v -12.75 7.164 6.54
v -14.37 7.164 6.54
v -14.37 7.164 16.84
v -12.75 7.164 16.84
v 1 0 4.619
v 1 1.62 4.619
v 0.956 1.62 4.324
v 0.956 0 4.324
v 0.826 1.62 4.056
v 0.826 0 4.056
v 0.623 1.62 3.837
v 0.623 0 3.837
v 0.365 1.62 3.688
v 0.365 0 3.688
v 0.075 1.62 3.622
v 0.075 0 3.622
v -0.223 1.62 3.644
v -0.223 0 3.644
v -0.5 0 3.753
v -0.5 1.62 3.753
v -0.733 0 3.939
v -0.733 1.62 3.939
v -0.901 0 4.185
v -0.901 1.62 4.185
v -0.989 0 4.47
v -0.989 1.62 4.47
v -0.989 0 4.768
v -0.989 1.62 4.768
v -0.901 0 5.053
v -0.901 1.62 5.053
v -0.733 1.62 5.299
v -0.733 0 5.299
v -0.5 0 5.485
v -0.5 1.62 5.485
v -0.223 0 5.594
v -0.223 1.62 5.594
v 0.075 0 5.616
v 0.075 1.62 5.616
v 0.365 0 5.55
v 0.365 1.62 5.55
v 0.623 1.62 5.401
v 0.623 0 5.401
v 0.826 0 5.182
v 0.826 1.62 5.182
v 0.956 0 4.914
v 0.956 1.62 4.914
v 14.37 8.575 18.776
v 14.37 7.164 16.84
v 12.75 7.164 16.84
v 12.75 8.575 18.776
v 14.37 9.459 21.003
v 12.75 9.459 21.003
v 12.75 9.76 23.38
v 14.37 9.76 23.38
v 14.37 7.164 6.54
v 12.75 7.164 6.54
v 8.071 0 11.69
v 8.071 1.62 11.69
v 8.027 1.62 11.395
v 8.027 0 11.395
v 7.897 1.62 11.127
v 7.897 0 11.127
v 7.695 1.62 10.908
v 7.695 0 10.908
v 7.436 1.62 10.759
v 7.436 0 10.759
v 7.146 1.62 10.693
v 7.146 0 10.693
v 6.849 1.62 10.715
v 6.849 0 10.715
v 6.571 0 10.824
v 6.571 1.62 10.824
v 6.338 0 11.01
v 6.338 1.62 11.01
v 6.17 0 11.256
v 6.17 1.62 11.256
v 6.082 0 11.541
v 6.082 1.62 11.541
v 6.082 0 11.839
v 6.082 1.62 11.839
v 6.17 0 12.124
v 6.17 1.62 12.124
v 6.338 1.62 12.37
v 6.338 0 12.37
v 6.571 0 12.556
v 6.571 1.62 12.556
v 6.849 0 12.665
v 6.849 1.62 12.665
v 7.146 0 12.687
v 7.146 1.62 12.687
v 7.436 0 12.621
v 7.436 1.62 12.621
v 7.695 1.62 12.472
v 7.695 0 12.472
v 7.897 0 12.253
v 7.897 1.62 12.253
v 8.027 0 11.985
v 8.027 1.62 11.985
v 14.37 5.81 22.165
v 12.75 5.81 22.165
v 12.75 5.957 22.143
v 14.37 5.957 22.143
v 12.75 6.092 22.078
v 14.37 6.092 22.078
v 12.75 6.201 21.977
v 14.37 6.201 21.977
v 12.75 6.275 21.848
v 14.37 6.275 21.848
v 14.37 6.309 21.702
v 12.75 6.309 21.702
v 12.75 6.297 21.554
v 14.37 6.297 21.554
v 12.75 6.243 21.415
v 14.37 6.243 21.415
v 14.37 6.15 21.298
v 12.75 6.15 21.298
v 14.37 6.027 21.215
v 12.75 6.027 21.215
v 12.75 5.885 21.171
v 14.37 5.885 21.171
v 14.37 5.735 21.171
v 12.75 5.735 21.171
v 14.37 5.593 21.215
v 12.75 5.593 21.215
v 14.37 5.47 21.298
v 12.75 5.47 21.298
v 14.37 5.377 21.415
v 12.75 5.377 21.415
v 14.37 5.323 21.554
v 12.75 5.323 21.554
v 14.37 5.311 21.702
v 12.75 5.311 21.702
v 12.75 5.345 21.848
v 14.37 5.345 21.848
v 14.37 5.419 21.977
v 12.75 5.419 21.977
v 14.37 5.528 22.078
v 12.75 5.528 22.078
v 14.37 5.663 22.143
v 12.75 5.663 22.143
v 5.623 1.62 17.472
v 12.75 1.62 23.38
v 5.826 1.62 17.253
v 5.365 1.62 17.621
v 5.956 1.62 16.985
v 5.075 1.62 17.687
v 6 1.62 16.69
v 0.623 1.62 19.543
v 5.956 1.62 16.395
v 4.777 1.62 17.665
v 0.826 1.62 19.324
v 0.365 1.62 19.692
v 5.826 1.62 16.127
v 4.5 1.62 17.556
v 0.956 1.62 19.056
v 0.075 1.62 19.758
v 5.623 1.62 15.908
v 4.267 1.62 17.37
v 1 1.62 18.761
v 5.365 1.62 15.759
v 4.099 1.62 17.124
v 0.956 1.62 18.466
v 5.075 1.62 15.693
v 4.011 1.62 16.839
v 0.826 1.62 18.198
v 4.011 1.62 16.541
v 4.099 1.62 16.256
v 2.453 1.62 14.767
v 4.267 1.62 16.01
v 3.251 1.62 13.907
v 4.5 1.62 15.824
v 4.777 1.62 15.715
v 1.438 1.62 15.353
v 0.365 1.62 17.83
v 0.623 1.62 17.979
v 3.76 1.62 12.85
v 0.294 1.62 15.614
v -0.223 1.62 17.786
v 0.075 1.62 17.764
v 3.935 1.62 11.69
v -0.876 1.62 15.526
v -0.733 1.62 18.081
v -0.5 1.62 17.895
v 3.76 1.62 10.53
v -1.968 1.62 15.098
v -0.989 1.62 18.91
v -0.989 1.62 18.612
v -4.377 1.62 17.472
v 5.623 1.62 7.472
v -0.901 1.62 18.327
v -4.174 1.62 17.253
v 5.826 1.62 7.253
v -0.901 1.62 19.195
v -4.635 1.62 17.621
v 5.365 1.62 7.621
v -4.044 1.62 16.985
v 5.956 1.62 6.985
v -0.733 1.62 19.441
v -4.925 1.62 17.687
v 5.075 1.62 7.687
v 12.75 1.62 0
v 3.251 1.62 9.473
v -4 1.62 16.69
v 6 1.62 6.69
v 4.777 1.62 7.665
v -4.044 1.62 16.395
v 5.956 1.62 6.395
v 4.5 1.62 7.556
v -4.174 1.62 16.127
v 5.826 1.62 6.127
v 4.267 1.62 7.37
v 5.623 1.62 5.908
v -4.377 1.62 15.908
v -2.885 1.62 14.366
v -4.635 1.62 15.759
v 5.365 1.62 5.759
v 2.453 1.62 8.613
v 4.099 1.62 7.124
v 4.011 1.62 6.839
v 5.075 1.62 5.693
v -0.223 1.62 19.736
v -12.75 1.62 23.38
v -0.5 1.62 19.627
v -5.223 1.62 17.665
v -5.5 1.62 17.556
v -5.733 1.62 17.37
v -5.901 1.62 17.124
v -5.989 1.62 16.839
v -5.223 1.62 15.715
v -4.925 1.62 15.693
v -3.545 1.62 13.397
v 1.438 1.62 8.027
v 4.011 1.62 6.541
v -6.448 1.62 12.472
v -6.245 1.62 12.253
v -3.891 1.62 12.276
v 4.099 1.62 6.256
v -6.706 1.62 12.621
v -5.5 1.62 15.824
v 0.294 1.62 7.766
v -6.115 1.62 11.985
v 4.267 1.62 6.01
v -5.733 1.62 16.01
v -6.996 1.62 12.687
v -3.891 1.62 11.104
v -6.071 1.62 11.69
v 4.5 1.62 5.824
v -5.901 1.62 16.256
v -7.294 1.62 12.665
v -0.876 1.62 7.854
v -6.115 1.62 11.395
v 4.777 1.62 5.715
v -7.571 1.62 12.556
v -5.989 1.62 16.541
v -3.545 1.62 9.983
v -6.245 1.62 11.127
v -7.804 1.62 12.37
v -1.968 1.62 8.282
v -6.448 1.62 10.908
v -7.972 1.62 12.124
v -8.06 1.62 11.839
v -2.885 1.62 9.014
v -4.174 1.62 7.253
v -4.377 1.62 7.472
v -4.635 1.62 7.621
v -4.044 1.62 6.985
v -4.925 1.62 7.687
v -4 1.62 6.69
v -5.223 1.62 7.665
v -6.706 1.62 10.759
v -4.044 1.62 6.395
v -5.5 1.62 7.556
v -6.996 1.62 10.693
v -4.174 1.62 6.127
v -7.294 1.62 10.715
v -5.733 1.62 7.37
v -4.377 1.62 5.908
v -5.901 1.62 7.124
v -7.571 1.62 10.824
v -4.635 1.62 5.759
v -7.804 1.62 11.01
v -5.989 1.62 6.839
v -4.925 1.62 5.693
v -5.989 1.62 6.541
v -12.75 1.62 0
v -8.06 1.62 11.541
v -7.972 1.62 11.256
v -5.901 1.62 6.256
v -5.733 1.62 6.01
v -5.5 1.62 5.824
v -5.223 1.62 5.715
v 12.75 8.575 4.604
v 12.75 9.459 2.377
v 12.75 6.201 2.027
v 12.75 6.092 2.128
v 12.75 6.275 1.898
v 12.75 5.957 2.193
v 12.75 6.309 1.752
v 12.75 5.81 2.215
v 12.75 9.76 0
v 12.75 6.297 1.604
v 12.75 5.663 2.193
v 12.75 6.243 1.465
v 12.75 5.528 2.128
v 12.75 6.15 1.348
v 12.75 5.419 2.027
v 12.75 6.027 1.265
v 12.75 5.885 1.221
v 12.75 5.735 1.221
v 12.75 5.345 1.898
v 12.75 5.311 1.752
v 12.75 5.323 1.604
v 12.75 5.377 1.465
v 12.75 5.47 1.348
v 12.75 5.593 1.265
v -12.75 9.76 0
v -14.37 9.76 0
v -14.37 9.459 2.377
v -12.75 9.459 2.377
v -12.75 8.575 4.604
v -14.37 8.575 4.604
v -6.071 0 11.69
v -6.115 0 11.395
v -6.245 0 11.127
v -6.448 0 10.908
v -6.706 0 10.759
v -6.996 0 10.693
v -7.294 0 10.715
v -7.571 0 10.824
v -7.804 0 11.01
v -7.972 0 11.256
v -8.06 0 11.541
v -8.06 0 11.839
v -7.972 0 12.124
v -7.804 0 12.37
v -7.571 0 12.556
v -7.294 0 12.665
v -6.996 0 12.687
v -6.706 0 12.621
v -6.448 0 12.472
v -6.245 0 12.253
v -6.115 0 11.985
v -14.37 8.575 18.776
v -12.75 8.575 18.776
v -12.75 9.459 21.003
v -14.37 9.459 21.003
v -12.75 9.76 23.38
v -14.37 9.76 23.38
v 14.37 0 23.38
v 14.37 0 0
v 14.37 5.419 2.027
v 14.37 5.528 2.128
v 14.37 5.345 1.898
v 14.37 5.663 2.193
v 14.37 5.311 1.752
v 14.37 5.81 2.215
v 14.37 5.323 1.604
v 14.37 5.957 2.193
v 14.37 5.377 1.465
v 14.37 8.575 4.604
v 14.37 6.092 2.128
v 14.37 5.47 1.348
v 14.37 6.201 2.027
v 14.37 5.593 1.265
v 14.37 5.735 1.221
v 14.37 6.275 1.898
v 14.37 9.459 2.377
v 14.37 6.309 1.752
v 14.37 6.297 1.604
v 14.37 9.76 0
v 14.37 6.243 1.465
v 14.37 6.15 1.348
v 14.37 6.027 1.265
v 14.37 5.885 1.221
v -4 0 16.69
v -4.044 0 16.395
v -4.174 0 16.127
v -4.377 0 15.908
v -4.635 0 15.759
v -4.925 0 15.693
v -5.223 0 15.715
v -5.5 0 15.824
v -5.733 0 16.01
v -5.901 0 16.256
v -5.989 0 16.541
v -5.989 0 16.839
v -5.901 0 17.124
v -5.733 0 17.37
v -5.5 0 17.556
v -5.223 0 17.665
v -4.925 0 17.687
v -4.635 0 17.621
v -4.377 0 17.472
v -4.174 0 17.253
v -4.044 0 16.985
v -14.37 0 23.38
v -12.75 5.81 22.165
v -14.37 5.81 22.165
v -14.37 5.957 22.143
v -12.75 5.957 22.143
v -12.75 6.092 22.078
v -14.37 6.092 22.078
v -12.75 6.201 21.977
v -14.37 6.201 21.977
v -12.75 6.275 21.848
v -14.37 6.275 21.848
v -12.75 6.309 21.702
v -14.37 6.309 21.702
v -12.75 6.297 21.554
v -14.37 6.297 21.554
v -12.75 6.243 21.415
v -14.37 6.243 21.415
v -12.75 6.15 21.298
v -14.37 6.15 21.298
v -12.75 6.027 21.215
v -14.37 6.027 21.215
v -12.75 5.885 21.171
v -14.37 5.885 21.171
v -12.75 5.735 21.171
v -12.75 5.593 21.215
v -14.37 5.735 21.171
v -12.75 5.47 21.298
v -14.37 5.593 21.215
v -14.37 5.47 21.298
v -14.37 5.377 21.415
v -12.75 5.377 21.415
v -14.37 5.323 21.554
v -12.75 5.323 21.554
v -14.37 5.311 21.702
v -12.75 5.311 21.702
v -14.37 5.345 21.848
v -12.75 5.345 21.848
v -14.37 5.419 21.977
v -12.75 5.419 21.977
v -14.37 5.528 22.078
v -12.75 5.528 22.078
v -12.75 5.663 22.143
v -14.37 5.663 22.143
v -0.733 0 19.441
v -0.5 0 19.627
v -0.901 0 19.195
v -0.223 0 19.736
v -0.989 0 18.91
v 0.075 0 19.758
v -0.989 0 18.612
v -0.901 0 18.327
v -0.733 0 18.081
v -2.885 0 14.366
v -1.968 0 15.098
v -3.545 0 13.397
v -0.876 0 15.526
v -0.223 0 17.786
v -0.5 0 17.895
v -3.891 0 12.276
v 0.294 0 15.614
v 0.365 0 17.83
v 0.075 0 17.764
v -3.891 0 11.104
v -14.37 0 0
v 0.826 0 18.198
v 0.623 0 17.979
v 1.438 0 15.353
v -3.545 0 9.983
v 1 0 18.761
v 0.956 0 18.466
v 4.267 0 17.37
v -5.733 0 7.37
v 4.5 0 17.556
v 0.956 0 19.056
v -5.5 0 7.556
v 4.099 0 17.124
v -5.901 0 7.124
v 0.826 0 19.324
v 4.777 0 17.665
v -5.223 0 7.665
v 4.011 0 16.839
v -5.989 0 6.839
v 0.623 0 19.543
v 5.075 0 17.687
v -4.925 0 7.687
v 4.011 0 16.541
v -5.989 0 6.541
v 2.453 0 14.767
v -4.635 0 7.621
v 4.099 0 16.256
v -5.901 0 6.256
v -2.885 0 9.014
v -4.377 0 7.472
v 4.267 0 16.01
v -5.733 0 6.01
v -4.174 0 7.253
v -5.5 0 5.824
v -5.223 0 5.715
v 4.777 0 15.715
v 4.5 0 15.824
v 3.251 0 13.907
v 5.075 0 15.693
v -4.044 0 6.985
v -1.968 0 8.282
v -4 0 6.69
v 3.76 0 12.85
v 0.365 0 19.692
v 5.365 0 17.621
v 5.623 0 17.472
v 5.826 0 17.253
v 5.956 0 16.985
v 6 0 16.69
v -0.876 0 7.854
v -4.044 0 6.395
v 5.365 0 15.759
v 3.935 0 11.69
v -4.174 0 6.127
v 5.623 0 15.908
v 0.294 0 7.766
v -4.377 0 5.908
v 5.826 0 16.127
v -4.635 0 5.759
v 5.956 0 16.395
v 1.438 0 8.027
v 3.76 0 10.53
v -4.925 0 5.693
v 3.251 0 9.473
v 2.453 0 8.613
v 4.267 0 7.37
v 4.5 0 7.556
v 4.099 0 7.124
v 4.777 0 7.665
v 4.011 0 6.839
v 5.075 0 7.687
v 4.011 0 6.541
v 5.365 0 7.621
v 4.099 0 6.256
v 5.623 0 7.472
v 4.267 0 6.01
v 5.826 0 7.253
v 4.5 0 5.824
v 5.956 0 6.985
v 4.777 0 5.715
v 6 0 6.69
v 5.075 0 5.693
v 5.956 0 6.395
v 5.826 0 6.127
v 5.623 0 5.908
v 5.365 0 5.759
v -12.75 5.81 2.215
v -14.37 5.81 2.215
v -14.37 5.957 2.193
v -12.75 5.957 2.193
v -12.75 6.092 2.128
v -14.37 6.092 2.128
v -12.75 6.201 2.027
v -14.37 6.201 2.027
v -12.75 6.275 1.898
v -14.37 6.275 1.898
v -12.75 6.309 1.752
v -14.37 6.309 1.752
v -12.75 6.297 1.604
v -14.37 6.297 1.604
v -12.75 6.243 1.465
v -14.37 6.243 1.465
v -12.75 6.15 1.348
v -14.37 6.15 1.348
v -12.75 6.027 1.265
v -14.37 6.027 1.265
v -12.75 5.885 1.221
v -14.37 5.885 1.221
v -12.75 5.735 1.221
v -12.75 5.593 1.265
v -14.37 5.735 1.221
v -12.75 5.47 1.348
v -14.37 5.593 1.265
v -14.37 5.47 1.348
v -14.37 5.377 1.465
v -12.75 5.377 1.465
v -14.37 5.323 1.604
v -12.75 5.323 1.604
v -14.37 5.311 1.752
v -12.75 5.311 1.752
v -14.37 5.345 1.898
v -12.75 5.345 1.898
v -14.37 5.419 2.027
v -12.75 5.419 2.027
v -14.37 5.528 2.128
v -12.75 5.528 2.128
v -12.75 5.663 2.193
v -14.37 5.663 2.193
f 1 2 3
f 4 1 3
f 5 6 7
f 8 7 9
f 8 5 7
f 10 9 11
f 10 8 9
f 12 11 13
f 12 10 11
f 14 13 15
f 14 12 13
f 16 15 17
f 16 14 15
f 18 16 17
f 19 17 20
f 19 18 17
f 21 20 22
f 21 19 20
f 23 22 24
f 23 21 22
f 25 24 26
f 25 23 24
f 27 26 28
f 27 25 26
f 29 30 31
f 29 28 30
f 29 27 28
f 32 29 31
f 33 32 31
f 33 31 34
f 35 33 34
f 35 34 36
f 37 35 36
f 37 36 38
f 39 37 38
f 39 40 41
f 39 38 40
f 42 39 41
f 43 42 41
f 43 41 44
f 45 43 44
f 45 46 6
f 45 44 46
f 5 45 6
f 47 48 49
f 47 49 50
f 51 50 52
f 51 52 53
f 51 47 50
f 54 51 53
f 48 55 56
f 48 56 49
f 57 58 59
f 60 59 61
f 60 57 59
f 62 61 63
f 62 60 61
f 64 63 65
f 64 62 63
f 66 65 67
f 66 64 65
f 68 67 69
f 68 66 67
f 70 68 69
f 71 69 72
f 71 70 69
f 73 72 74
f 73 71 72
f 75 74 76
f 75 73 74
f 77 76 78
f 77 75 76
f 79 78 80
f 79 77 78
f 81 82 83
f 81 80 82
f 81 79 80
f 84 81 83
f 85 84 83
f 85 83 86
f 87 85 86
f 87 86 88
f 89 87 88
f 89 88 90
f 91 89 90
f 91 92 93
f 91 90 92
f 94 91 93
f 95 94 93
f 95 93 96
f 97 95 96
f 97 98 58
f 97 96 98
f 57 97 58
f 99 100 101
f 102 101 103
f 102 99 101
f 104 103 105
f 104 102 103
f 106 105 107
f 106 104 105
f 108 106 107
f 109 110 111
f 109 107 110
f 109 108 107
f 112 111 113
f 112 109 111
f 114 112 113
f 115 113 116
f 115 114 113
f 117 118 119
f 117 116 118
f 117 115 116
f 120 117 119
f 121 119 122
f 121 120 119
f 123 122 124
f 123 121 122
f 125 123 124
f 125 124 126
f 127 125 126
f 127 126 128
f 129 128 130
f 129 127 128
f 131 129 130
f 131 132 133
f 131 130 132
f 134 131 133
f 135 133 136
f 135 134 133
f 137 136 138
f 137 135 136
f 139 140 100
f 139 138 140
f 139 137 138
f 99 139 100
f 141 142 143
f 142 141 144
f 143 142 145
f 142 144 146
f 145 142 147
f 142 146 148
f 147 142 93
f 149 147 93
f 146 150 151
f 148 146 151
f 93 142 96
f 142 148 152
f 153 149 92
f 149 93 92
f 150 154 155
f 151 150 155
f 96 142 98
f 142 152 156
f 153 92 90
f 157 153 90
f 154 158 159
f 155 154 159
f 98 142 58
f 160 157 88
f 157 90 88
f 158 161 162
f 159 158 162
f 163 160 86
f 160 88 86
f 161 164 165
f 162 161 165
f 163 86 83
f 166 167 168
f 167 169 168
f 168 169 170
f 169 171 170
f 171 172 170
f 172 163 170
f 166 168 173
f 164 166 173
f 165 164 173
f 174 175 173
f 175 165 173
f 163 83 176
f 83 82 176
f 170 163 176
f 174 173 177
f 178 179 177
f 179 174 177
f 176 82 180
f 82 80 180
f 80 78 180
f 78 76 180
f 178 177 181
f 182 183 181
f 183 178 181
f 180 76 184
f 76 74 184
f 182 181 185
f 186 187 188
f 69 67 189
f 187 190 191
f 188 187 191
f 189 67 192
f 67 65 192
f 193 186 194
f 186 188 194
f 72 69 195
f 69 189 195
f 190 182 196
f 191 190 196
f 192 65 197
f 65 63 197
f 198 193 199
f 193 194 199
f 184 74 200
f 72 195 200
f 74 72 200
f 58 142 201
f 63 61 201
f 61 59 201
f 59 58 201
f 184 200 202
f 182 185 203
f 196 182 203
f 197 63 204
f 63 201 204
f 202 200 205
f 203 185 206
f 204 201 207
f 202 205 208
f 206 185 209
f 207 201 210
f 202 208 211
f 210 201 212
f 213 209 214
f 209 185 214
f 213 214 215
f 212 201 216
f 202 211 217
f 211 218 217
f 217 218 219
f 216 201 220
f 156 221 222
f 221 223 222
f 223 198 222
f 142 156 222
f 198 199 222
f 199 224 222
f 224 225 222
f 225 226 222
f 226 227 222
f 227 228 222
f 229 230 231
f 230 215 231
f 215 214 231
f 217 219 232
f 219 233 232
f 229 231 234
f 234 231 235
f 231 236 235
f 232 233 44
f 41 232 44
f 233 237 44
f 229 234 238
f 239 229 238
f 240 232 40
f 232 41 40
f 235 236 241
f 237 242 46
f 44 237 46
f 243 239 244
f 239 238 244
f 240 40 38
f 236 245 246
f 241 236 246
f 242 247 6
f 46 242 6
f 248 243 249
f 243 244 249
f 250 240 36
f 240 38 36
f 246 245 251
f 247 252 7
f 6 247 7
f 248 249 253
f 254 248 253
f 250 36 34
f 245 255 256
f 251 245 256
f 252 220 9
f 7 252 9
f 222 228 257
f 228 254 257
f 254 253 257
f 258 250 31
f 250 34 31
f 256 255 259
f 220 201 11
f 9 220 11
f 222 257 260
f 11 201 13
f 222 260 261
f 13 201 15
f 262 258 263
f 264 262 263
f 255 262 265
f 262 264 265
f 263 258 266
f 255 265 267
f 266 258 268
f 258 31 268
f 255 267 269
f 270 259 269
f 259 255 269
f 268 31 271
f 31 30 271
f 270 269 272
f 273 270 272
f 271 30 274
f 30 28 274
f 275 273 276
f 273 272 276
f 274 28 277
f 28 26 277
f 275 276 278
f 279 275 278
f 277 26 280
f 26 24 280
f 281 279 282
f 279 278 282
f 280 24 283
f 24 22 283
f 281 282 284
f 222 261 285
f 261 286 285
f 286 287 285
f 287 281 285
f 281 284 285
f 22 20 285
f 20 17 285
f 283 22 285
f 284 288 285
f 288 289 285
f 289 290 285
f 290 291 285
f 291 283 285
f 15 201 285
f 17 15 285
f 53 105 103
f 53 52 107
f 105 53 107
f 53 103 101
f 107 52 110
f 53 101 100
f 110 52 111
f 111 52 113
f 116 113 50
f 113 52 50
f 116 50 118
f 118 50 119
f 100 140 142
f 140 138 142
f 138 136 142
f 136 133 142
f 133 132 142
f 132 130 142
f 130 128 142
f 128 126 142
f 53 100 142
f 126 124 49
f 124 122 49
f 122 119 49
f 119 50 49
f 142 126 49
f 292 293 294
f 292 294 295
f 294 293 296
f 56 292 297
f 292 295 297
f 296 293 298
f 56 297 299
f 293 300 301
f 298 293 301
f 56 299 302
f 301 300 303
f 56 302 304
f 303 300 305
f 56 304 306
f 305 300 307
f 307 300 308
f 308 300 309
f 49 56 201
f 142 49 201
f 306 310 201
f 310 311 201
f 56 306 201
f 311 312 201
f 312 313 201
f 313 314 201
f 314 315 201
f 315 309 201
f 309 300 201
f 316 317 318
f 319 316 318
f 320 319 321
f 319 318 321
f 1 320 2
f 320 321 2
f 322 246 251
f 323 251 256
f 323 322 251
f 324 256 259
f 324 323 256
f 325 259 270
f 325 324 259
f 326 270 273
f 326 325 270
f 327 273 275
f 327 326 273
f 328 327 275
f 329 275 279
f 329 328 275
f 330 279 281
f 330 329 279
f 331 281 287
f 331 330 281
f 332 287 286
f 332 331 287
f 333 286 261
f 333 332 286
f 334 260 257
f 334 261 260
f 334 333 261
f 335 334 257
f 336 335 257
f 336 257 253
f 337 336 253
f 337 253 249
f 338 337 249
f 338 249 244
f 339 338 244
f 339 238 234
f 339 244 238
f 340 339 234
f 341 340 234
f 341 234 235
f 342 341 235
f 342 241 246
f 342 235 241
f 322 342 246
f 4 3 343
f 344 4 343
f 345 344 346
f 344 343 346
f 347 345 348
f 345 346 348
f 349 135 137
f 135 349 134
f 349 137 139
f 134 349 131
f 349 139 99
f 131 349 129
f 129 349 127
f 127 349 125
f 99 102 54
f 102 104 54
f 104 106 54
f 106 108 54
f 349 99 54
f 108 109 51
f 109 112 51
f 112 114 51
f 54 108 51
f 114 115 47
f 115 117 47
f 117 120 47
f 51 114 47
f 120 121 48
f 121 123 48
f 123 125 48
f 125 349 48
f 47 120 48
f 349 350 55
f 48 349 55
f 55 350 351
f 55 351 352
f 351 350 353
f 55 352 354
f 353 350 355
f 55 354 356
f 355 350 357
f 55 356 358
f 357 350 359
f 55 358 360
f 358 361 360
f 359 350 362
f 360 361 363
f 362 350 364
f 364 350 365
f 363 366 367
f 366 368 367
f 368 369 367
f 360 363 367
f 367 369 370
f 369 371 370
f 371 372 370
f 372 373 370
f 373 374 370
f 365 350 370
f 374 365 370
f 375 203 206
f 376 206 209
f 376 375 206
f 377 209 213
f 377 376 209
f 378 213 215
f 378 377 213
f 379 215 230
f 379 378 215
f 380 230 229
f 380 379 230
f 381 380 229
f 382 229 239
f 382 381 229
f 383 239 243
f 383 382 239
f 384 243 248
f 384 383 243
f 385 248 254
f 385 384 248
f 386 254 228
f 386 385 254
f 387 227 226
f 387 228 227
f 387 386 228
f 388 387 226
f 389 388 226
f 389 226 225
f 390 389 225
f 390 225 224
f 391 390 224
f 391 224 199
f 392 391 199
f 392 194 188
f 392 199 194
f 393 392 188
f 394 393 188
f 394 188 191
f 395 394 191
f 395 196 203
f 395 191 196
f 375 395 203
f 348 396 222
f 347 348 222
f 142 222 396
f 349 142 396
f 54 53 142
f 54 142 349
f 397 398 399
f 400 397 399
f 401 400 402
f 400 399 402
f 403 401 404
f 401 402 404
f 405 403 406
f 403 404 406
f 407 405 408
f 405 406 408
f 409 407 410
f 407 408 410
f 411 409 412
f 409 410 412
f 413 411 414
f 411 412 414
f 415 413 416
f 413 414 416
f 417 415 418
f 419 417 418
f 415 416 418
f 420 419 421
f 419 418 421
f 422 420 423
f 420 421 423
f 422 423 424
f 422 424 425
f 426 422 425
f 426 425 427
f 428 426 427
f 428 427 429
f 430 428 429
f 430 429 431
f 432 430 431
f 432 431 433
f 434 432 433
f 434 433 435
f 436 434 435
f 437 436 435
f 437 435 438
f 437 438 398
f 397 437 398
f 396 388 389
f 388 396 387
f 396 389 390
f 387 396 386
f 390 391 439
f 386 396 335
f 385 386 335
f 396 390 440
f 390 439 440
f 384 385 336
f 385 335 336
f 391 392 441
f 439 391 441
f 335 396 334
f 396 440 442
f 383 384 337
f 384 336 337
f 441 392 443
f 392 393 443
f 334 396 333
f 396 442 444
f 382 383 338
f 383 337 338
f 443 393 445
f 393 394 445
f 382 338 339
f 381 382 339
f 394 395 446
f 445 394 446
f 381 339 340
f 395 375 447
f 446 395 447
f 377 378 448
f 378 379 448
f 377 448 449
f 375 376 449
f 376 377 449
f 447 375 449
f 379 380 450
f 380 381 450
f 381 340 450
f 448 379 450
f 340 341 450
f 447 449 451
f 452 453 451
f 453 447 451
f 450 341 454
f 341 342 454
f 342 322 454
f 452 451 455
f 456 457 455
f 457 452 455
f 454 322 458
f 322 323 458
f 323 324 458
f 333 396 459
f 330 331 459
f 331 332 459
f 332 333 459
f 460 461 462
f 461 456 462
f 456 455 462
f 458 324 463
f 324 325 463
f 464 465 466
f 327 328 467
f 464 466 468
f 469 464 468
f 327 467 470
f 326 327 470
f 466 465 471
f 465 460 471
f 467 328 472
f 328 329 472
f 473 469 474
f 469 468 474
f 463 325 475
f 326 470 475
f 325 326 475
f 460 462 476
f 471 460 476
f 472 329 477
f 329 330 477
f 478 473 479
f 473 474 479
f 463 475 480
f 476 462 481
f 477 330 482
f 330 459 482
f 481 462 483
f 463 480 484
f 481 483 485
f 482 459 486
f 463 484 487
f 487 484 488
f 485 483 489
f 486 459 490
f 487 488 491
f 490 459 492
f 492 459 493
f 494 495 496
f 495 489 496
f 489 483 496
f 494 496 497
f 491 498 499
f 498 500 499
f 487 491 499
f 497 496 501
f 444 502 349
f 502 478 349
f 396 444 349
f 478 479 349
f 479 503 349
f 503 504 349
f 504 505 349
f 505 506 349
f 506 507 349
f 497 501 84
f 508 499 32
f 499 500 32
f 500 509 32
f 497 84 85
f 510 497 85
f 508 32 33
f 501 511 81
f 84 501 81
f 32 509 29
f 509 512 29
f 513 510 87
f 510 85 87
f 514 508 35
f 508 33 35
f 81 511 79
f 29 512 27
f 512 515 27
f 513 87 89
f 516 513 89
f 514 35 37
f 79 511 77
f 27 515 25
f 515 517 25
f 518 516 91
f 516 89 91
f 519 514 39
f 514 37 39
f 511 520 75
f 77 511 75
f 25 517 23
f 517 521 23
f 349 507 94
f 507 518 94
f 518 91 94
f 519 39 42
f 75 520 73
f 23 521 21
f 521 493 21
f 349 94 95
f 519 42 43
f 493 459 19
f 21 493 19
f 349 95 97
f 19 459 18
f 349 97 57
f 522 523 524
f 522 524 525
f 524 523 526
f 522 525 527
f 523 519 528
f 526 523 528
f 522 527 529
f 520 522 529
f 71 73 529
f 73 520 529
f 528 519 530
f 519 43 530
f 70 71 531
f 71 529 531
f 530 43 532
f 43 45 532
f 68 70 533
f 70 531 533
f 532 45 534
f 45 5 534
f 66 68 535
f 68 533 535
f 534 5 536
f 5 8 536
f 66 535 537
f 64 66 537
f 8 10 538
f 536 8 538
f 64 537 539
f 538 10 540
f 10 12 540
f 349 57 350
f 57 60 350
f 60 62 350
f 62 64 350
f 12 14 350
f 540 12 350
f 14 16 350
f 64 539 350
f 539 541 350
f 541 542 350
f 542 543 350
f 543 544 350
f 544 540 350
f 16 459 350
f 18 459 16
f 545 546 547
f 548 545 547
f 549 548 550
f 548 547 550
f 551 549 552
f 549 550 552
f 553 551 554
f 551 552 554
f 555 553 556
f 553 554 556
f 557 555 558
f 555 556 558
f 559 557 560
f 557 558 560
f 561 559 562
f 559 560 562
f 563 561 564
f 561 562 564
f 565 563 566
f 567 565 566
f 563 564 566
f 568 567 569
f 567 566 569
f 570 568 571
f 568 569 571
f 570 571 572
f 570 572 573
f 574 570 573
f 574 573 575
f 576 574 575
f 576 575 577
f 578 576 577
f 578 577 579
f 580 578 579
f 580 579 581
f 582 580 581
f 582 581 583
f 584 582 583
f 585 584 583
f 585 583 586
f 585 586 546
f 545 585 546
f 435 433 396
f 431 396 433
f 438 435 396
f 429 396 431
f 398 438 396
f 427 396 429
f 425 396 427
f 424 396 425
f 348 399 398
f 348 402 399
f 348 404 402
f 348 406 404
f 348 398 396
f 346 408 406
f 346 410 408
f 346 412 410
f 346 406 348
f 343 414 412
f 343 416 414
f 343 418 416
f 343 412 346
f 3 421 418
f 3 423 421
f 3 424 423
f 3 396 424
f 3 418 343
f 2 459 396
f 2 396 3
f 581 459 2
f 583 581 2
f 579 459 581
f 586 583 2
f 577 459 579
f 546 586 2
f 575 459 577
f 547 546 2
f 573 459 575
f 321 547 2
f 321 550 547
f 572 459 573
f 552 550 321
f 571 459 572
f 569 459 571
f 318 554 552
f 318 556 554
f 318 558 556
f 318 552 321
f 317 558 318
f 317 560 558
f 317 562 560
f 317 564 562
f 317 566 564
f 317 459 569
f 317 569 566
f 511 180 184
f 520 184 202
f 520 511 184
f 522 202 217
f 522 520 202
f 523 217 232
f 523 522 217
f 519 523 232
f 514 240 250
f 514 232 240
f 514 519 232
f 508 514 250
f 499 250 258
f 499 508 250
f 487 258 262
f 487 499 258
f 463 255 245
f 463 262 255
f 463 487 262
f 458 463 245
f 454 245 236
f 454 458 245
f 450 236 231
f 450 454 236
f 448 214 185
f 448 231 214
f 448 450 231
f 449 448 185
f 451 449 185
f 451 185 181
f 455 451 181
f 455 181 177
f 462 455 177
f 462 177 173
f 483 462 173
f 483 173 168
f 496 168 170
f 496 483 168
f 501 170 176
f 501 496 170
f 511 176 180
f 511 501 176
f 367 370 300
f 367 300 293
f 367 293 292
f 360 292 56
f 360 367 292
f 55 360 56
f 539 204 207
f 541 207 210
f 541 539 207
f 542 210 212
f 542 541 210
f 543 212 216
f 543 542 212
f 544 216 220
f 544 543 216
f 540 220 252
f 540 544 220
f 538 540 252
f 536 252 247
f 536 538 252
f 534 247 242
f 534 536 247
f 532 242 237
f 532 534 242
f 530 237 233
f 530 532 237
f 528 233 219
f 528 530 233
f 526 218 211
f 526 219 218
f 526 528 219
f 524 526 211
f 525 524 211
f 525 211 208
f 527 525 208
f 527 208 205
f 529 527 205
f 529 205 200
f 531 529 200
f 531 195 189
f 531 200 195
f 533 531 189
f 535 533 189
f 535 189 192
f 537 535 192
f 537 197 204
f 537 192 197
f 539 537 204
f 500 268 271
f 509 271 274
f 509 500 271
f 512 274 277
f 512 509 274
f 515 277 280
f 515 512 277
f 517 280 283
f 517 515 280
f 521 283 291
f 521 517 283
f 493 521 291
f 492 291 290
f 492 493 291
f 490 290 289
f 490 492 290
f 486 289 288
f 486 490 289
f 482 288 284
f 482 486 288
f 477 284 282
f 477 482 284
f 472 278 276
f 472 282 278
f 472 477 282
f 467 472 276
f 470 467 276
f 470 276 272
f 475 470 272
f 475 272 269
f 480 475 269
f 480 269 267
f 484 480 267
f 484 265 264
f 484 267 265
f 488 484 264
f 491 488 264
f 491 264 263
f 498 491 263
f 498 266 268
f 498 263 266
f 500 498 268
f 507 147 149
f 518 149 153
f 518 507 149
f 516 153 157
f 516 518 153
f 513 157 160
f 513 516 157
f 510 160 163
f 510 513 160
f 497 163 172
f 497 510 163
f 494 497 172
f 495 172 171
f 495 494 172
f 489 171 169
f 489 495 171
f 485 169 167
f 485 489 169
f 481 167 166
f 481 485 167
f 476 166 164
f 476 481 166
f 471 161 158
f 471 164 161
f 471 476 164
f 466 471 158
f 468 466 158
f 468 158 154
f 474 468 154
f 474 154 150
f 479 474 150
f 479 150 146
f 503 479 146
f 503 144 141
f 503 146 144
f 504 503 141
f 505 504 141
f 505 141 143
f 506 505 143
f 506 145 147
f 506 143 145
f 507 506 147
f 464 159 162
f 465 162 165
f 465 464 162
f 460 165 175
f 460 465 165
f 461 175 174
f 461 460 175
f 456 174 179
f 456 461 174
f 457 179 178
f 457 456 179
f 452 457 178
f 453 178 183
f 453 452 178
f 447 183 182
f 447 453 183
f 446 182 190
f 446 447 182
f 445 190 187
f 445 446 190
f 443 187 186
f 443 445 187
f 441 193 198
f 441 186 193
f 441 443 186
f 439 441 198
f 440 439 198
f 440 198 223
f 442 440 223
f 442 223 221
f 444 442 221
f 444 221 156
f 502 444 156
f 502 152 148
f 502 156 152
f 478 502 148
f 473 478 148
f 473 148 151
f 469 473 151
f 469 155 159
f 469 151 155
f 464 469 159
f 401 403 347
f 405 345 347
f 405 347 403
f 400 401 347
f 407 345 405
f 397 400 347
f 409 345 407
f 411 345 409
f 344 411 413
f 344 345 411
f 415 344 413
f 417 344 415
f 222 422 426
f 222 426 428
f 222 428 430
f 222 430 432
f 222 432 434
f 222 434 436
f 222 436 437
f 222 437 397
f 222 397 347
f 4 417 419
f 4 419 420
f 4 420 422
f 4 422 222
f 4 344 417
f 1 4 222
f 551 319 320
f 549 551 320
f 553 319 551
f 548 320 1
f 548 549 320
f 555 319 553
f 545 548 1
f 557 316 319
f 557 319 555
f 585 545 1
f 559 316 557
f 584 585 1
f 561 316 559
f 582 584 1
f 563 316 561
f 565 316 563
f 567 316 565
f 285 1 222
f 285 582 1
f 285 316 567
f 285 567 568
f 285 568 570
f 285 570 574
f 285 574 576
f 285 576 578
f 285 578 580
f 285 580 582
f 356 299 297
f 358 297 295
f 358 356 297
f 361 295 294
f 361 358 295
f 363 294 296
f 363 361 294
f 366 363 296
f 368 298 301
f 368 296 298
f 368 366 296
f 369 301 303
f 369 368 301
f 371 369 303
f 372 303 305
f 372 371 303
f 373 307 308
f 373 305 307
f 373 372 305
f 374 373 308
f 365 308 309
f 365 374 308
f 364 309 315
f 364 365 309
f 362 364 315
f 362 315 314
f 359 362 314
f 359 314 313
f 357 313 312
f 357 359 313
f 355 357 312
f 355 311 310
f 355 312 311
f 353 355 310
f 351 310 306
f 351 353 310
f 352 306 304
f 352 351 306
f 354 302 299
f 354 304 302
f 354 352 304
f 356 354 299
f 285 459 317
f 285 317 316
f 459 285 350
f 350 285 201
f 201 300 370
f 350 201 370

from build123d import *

# Parameters (mm, degrees)
BOSS_EXTRUDE1_DEPTH = 23.38
SKETCH2_R           = 0.5
CUT_EXTRUDE1_DEPTH  = 44.5
SKETCH3_R           = 1
SKETCH3_R_2         = 3.935
CUT_EXTRUDE2_DEPTH  = 20.5


with BuildPart() as part:
    # Sketch1 → Boss-Extrude1 (new body)
    with BuildSketch(Plane.XY):
        Polygon((0, 0), (-14.37, 0), (-14.37, 9.76), (-12.75, 9.76), (-12.75, 1.62), (0, 1.62), align=None)
    boss_extrude1 = extrude(amount=BOSS_EXTRUDE1_DEPTH)

    # Sketch2 → Cut-Extrude1 (cut)
    with BuildSketch(Plane.ZY.offset(14.37)):
        with Locations((1.715, 5.81)):
            Circle(SKETCH2_R)
        with Locations((21.665, 5.81)):
            Circle(SKETCH2_R)
        with BuildLine():
            Line((6.539942279, 7.163555861), (16.840057721, 7.163555861))
            ThreePointArc((16.840057721, 7.163555861), (19.861748759, 9.087147646), (23.38, 9.76))
            Line((23.38, 9.76), (23.38, 14.744822673))
            Line((23.38, 14.744822673), (0, 14.744822673))
            Line((0, 14.744822673), (0, 9.76))
            ThreePointArc((0, 9.76), (3.518251241, 9.087147646), (6.539942279, 7.163555861))
        make_face()
    cut_extrude1 = extrude(amount=-CUT_EXTRUDE1_DEPTH, mode=Mode.SUBTRACT)

    # Mirror1: Boss-Extrude1, Cut-Extrude1 across plane
    add(boss_extrude1.mirror(Plane(origin=(0, 1.62, 23.38), x_dir=(0, 0, 1), z_dir=(-1, 0, 0))))
    add(cut_extrude1.mirror(Plane(origin=(0, 1.62, 23.38), x_dir=(0, 0, 1), z_dir=(-1, 0, 0))), mode=Mode.SUBTRACT)

    # Sketch3 → Cut-Extrude2 (cut)
    with BuildSketch(Plane(origin=(0, 0, 0), x_dir=(1, 0, 0), z_dir=(0, 1, 0))):
        with Locations((-7.071067812, -11.69)):
            Circle(SKETCH3_R)
        with Locations((7.071067812, -11.69)):
            Circle(SKETCH3_R)
        with Locations((5, -6.69)):
            Circle(SKETCH3_R)
        with Locations((-5, -6.69)):
            Circle(SKETCH3_R)
        with Locations((0, -11.69)):
            Circle(SKETCH3_R_2)
        with Locations((-5, -16.69)):
            Circle(SKETCH3_R)
        with Locations((5, -16.69)):
            Circle(SKETCH3_R)
        with Locations((0, -18.761067812)):
            Circle(SKETCH3_R)
        with Locations((0, -4.618932188)):
            Circle(SKETCH3_R)
    extrude(amount=CUT_EXTRUDE2_DEPTH, mode=Mode.SUBTRACT)


solid = part.part
